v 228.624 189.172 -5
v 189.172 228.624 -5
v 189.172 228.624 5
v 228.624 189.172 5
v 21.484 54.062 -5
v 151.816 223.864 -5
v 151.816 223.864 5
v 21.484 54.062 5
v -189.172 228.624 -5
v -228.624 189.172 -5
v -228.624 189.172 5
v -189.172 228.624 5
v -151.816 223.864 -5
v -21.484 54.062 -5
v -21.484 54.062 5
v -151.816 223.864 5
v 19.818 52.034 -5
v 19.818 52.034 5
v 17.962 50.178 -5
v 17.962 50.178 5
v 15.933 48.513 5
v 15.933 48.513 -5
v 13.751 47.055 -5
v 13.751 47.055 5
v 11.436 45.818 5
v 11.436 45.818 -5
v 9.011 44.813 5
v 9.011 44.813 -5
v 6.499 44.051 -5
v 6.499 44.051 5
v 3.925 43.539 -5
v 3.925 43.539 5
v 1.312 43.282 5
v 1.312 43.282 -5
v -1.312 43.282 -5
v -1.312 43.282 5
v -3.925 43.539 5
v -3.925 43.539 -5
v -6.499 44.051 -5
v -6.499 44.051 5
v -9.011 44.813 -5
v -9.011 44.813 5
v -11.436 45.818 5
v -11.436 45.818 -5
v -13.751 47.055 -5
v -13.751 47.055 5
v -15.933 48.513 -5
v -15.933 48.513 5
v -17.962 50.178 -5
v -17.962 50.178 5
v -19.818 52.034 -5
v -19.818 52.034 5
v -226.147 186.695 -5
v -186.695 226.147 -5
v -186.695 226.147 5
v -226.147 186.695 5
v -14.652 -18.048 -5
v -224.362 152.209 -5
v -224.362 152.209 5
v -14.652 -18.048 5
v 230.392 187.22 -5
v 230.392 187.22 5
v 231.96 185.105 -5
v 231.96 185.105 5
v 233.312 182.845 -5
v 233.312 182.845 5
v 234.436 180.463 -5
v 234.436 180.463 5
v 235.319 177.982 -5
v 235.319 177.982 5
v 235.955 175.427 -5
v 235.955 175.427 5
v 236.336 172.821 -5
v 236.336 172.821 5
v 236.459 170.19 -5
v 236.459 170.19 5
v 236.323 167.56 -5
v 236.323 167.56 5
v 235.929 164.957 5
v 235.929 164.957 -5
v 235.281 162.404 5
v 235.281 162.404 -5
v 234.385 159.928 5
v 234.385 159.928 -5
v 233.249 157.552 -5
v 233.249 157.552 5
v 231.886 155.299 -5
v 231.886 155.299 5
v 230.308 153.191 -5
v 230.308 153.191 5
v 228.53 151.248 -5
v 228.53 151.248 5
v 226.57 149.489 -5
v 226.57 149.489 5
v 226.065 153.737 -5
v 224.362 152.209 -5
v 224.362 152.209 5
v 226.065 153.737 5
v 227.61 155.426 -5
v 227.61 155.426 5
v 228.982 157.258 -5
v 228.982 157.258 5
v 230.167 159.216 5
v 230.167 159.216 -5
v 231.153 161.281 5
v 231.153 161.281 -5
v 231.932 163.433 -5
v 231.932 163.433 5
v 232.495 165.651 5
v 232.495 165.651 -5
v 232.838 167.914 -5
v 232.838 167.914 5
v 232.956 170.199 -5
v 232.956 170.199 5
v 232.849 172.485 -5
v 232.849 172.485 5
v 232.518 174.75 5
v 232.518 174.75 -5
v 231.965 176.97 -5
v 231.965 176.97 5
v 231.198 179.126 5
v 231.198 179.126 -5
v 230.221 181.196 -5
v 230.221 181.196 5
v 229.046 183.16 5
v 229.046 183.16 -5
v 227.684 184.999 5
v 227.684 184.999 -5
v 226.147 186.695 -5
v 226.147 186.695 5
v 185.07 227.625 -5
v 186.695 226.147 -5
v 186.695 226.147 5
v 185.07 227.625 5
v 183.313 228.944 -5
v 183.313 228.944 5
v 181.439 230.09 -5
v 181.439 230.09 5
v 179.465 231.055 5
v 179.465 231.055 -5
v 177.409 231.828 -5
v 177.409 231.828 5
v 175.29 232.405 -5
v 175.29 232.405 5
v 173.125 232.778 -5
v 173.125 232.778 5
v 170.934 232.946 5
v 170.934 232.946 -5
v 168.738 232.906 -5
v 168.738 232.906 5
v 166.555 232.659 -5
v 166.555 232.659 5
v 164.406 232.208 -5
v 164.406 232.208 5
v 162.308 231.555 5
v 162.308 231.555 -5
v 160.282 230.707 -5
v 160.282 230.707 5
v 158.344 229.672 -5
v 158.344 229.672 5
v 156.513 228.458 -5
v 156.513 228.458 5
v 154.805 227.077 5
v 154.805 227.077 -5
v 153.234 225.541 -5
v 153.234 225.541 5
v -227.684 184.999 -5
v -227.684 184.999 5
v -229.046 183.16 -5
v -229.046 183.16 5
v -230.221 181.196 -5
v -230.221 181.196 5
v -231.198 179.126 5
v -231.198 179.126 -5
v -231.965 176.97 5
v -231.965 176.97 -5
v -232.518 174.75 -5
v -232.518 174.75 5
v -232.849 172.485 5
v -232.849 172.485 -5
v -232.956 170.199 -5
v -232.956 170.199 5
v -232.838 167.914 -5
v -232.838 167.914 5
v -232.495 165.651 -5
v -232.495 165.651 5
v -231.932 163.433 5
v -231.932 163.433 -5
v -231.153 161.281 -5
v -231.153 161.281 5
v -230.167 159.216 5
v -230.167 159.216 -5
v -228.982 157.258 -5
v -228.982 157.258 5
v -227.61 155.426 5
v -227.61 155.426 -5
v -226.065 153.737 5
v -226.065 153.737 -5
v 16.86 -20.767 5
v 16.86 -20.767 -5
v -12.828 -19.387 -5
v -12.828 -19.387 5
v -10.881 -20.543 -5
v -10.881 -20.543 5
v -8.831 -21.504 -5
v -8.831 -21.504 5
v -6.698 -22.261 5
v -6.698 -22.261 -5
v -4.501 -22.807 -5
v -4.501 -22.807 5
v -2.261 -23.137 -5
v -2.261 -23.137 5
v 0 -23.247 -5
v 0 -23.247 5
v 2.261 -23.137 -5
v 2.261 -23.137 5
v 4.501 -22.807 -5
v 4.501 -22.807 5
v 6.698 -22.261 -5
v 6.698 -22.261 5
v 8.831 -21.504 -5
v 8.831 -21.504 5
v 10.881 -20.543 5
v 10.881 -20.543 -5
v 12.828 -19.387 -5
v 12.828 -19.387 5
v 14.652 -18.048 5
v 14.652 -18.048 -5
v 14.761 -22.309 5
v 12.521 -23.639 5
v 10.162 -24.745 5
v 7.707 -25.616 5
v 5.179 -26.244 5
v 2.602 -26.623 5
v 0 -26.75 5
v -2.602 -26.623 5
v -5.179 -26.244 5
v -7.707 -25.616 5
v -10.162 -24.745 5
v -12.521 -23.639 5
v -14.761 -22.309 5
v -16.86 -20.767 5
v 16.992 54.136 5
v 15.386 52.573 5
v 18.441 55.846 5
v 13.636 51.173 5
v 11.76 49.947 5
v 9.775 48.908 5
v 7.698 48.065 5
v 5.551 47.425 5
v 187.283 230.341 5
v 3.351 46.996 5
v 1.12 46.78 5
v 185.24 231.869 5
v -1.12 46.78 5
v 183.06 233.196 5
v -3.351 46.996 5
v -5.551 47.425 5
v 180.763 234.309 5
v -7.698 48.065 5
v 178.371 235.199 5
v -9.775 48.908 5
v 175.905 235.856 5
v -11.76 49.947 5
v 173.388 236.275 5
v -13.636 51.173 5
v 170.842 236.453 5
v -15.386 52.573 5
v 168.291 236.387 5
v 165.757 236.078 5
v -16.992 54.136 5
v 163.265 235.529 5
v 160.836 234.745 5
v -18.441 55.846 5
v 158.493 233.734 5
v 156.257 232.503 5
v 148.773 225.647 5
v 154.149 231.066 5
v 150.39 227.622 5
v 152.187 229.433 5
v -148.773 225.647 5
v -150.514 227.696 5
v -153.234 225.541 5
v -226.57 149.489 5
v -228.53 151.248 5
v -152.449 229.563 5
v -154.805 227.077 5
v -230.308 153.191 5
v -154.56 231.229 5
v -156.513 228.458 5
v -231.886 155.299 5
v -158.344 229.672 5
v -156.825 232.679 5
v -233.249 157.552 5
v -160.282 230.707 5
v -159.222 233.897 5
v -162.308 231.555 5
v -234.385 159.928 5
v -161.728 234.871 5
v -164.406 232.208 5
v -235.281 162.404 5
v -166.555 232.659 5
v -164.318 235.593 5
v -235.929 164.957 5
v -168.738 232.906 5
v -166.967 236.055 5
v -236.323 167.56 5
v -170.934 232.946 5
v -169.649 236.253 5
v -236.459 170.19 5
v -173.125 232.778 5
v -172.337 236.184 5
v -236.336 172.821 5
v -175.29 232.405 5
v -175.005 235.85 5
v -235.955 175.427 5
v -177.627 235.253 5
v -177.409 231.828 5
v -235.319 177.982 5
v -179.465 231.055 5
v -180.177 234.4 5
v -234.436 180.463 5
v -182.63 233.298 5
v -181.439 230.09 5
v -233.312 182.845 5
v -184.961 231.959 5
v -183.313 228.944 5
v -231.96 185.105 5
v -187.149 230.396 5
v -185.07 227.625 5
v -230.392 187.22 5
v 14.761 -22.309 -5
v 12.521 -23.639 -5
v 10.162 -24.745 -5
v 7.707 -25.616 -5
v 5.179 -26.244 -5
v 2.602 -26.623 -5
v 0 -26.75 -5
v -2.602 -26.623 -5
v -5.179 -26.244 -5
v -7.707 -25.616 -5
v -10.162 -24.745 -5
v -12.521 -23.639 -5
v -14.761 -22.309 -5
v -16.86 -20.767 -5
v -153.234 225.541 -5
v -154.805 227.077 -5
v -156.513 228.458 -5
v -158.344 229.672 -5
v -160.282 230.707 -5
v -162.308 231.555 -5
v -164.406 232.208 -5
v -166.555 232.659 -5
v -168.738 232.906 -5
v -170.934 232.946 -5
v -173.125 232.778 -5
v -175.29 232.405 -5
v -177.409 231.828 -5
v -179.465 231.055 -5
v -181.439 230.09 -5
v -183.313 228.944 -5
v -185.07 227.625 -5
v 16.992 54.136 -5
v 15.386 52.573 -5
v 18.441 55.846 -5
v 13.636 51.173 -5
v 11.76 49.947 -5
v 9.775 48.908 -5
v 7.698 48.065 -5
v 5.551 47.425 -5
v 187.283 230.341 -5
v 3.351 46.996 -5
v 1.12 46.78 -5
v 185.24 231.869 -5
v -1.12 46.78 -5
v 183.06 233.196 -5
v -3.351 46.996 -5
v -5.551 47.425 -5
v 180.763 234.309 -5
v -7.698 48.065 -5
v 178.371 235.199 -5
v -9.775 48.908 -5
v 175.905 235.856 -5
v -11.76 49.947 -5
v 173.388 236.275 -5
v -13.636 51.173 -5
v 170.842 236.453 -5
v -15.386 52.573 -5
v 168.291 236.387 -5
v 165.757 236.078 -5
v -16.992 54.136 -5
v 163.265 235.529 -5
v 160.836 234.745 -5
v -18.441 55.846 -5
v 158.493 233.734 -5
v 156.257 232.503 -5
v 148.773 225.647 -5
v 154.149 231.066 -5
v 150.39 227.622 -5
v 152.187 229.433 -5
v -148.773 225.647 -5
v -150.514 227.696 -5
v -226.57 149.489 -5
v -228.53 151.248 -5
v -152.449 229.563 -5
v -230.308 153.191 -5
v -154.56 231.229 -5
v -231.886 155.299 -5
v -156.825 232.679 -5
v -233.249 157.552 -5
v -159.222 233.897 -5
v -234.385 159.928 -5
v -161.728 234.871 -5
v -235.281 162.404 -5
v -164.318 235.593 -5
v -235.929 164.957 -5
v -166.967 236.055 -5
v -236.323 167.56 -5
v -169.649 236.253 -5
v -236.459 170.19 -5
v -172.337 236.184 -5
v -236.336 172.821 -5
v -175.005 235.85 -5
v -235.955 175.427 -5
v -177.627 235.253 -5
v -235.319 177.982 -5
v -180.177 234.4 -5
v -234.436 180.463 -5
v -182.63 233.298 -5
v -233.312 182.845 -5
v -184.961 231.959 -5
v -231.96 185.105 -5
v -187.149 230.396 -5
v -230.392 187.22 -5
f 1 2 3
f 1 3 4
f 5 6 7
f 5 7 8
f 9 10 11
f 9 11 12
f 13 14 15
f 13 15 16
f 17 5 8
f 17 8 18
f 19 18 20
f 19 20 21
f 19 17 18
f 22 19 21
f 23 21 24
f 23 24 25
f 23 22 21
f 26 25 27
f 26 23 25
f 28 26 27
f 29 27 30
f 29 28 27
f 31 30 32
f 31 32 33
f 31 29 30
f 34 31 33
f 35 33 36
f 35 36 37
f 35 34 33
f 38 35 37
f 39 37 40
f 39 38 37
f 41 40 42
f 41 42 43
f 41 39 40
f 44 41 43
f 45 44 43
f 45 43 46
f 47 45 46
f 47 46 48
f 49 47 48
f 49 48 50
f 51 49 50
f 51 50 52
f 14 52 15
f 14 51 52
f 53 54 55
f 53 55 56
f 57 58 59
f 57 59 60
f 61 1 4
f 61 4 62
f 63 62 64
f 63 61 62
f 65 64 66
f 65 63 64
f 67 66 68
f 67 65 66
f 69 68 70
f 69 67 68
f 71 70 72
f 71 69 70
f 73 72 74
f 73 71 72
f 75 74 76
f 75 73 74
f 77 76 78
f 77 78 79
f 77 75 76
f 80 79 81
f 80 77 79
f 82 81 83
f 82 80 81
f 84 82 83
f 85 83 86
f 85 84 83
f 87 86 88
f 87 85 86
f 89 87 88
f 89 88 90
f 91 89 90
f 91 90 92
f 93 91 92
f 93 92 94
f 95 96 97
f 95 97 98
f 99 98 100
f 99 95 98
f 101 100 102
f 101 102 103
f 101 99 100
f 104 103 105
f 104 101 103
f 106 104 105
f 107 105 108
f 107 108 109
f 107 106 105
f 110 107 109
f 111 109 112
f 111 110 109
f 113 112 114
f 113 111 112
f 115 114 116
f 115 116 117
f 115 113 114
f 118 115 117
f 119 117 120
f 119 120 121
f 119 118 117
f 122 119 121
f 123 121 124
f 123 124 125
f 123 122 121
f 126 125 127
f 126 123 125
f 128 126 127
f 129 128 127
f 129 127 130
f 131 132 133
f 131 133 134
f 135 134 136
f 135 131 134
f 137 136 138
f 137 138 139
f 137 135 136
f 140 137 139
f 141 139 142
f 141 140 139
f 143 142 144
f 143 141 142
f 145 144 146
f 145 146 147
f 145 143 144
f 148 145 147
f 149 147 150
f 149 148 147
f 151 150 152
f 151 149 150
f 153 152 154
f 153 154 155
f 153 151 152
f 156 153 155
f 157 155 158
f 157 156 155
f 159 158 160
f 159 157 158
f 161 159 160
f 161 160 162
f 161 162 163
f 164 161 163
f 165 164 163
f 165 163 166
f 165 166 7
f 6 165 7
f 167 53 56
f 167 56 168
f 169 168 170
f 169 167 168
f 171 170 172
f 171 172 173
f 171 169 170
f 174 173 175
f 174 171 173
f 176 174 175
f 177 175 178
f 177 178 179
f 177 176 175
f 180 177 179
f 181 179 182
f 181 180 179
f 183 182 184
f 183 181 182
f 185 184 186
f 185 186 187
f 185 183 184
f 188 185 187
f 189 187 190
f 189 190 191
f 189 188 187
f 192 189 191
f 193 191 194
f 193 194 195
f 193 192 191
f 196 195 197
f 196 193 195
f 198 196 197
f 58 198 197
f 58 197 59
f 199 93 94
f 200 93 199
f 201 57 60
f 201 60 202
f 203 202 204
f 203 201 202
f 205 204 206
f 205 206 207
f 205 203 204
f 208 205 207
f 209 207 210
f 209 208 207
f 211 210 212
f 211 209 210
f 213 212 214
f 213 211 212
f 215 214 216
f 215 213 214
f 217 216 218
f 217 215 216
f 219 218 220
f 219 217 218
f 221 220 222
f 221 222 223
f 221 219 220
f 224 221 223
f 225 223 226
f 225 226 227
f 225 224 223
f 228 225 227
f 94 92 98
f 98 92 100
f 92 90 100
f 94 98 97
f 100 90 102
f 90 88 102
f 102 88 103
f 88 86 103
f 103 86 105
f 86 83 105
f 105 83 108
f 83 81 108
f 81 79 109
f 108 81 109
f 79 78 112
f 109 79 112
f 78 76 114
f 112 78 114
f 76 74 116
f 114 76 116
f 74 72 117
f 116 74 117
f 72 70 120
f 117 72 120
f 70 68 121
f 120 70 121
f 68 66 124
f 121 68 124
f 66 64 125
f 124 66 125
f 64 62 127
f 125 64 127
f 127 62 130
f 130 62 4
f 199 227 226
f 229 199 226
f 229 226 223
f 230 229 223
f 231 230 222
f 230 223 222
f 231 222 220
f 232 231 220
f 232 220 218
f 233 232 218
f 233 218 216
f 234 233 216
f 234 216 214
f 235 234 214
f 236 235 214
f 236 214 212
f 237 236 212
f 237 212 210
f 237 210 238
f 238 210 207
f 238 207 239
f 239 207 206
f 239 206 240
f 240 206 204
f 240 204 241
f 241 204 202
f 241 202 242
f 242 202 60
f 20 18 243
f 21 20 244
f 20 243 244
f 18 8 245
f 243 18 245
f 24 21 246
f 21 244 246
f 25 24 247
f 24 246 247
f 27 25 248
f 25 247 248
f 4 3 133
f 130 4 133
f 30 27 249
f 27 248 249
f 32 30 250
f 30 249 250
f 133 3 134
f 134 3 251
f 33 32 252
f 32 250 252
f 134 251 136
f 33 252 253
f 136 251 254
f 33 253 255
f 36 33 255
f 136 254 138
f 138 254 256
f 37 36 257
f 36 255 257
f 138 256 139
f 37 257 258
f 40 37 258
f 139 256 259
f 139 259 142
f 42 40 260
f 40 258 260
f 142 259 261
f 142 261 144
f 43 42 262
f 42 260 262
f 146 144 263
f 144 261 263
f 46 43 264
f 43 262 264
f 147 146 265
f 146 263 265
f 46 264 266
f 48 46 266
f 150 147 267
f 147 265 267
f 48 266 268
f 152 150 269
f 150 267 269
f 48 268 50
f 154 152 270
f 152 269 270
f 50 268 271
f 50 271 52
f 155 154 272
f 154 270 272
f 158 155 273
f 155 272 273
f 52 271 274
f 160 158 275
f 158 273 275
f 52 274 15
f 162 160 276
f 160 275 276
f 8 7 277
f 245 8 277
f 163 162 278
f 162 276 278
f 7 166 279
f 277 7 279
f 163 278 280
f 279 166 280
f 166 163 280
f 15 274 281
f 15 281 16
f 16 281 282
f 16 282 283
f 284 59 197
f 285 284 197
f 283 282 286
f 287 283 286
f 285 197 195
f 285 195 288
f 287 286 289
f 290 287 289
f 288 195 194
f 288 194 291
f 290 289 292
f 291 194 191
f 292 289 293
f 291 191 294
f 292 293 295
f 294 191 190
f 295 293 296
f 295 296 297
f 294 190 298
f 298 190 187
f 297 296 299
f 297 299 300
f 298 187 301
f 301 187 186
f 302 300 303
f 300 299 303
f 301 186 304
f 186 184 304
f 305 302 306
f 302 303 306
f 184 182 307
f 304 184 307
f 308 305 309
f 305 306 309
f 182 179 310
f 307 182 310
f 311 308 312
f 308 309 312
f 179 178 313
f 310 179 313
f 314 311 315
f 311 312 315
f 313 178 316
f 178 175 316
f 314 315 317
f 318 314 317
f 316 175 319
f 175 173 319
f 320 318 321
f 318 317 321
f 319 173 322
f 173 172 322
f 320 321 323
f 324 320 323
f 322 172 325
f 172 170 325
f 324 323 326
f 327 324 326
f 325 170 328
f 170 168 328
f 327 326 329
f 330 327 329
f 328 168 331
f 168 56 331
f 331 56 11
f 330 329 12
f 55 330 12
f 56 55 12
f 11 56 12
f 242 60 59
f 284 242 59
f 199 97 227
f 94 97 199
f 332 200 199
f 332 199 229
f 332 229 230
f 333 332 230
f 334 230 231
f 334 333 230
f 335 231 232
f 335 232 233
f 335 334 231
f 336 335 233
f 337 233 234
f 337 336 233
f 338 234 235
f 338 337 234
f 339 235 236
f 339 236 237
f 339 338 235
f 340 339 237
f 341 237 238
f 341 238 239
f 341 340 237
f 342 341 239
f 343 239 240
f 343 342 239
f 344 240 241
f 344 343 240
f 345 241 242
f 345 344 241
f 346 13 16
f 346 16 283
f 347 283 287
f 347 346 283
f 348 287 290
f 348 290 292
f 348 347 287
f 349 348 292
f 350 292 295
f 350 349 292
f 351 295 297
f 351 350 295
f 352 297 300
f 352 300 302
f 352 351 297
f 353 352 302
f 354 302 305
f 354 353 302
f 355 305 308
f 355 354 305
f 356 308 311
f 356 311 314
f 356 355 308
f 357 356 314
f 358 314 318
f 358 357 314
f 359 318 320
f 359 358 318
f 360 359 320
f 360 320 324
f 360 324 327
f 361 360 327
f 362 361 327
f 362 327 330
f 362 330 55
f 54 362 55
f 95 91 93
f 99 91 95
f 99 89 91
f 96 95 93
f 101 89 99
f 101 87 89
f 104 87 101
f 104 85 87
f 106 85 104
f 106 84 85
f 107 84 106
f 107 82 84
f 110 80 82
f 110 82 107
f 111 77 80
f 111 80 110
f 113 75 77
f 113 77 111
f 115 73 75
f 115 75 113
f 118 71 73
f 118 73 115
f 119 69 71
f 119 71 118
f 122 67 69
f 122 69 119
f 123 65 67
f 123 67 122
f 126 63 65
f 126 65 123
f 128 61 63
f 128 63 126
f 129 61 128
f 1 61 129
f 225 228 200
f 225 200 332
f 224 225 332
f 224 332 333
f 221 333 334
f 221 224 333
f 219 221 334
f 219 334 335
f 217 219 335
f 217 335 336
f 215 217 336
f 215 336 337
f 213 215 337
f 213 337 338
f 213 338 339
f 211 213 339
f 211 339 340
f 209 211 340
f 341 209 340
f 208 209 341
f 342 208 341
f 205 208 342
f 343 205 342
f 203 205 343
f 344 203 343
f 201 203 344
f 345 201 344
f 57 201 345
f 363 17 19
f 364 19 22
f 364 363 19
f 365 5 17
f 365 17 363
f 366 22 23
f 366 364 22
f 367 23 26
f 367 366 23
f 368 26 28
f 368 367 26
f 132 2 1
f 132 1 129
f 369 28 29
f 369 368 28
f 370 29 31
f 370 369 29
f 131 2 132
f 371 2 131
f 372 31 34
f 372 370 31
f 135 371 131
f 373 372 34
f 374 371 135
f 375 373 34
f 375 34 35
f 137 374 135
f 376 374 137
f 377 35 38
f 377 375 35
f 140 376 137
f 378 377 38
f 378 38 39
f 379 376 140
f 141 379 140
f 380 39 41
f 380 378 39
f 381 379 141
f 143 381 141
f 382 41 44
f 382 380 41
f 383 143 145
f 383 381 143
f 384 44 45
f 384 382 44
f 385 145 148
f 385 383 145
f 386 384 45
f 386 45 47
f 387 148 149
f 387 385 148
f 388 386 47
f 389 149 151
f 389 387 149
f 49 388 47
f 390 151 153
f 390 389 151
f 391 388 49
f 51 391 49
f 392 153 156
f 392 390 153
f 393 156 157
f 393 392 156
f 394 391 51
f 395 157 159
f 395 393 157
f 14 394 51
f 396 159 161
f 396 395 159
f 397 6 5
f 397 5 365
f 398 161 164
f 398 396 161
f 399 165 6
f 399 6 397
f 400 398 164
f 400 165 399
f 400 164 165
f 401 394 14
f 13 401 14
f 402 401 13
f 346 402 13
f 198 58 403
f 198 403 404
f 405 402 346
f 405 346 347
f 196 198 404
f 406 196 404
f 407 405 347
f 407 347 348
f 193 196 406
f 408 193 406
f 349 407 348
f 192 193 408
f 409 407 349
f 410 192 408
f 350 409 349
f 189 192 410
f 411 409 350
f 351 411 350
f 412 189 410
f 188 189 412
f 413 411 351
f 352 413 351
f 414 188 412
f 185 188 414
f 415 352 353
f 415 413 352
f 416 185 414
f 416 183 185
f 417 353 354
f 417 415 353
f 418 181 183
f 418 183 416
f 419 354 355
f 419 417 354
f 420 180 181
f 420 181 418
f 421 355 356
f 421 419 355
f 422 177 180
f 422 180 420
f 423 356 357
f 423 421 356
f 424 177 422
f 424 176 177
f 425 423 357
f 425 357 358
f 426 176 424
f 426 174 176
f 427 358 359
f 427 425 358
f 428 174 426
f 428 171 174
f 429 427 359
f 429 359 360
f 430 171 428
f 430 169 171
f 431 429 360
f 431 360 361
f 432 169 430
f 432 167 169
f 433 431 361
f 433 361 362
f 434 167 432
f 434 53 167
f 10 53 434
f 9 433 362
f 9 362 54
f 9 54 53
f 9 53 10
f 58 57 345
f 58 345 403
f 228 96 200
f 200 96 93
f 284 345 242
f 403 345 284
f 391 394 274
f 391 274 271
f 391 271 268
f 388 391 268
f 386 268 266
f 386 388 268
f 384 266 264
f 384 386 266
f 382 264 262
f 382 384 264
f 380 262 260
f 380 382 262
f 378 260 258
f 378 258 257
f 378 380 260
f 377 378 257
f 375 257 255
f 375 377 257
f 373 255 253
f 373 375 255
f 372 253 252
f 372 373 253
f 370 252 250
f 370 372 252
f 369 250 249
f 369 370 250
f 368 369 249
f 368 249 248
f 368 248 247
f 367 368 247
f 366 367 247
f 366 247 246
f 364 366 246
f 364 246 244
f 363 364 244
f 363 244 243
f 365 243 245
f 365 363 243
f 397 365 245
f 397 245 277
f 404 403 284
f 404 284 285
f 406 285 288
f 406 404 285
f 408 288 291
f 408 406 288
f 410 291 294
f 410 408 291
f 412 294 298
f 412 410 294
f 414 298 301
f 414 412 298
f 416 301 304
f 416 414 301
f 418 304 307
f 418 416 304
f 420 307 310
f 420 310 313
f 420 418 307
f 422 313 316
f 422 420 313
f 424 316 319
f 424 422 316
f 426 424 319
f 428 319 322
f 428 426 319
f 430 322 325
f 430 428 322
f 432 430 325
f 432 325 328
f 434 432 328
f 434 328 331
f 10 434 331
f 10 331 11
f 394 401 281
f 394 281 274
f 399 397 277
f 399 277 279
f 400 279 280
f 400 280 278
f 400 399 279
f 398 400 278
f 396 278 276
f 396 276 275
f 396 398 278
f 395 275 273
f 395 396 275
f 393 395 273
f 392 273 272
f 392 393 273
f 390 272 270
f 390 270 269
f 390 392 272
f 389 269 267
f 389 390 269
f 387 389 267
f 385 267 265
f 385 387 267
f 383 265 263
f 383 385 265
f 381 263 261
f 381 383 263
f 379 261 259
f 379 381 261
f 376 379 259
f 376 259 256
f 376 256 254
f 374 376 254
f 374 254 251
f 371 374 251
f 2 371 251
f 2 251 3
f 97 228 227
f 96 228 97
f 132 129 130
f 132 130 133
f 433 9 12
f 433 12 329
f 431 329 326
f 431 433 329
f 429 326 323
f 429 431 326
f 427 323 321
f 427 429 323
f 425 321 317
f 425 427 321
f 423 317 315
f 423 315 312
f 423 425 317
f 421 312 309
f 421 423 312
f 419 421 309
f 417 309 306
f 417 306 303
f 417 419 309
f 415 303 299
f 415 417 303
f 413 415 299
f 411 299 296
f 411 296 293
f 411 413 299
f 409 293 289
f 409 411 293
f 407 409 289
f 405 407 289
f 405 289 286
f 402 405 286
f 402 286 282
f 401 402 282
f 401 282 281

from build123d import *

# Parameters (mm, degrees)
BOSS_EXTRUDE1_DEPTH      = 5
BOSS_EXTRUDE1_DEPTH_BACK = 5


with BuildPart() as part:
    # Sketch3 → Boss-Extrude1 (new, two sides: drawn at the far end of the back side and taken through both)
    with BuildSketch(Plane.XY.offset(-BOSS_EXTRUDE1_DEPTH_BACK)):
        with BuildLine():
            Line((-148.773080728, 225.6468162), (-18.440943254, 55.845528153))
            ThreePointArc((-18.440943254, 55.845528153), (0, 46.75311932), (18.440943254, 55.845528153))
            Line((18.440943254, 55.845528153), (148.773080728, 225.6468162))
            ThreePointArc((148.773080728, 225.6468162), (168.290702347, 236.386792537), (189.171977646, 228.624255112))
            Line((189.171977646, 228.624255112), (228.624255112, 189.171977646))
            ThreePointArc((228.624255112, 189.171977646), (236.423365061, 168.873706393), (226.569637526, 149.489434791))
            Line((226.569637526, 149.489434791), (16.86048881, -20.767436459))
            ThreePointArc((16.86048881, -20.767436459), (0, -26.75), (-16.86048881, -20.767436459))
            Line((-16.86048881, -20.767436459), (-226.569637526, 149.489434791))
            ThreePointArc((-226.569637526, 149.489434791), (-236.423365061, 168.873706393), (-228.624255112, 189.171977646))
            Line((-228.624255112, 189.171977646), (-189.171977646, 228.624255112))
            ThreePointArc((-189.171977646, 228.624255112), (-168.30539851, 236.187390033), (-148.773080728, 225.6468162))
        make_face()
        with BuildLine():
            Line((-21.483790521, 54.062332516), (-151.815927996, 223.863620563))
            ThreePointArc((-151.815927996, 223.863620563), (-168.738130189, 232.90636594), (-186.69489822, 226.147175686))
            Line((-186.69489822, 226.147175686), (-226.147175686, 186.69489822))
            ThreePointArc((-226.147175686, 186.69489822), (-232.924931888, 169.054842525), (-224.361626158, 152.20909116))
            Line((-224.361626158, 152.20909116), (-14.652477443, -18.04778009))
            ThreePointArc((-14.652477443, -18.04778009), (0, -23.24688068), (14.652477443, -18.04778009))
            Line((14.652477443, -18.04778009), (224.361626158, 152.20909116))
            ThreePointArc((224.361626158, 152.20909116), (232.924931888, 169.054842525), (226.147175686, 186.69489822))
            Line((226.147175686, 186.69489822), (186.69489822, 226.147175686))
            ThreePointArc((186.69489822, 226.147175686), (168.738130189, 232.90636594), (151.815927996, 223.863620563))
            Line((151.815927996, 223.863620563), (21.483790521, 54.062332516))
            ThreePointArc((21.483790521, 54.062332516), (0, 43.25), (-21.483790521, 54.062332516))
        make_face(mode=Mode.SUBTRACT)
    extrude(amount=BOSS_EXTRUDE1_DEPTH + BOSS_EXTRUDE1_DEPTH_BACK)


solid = part.part
